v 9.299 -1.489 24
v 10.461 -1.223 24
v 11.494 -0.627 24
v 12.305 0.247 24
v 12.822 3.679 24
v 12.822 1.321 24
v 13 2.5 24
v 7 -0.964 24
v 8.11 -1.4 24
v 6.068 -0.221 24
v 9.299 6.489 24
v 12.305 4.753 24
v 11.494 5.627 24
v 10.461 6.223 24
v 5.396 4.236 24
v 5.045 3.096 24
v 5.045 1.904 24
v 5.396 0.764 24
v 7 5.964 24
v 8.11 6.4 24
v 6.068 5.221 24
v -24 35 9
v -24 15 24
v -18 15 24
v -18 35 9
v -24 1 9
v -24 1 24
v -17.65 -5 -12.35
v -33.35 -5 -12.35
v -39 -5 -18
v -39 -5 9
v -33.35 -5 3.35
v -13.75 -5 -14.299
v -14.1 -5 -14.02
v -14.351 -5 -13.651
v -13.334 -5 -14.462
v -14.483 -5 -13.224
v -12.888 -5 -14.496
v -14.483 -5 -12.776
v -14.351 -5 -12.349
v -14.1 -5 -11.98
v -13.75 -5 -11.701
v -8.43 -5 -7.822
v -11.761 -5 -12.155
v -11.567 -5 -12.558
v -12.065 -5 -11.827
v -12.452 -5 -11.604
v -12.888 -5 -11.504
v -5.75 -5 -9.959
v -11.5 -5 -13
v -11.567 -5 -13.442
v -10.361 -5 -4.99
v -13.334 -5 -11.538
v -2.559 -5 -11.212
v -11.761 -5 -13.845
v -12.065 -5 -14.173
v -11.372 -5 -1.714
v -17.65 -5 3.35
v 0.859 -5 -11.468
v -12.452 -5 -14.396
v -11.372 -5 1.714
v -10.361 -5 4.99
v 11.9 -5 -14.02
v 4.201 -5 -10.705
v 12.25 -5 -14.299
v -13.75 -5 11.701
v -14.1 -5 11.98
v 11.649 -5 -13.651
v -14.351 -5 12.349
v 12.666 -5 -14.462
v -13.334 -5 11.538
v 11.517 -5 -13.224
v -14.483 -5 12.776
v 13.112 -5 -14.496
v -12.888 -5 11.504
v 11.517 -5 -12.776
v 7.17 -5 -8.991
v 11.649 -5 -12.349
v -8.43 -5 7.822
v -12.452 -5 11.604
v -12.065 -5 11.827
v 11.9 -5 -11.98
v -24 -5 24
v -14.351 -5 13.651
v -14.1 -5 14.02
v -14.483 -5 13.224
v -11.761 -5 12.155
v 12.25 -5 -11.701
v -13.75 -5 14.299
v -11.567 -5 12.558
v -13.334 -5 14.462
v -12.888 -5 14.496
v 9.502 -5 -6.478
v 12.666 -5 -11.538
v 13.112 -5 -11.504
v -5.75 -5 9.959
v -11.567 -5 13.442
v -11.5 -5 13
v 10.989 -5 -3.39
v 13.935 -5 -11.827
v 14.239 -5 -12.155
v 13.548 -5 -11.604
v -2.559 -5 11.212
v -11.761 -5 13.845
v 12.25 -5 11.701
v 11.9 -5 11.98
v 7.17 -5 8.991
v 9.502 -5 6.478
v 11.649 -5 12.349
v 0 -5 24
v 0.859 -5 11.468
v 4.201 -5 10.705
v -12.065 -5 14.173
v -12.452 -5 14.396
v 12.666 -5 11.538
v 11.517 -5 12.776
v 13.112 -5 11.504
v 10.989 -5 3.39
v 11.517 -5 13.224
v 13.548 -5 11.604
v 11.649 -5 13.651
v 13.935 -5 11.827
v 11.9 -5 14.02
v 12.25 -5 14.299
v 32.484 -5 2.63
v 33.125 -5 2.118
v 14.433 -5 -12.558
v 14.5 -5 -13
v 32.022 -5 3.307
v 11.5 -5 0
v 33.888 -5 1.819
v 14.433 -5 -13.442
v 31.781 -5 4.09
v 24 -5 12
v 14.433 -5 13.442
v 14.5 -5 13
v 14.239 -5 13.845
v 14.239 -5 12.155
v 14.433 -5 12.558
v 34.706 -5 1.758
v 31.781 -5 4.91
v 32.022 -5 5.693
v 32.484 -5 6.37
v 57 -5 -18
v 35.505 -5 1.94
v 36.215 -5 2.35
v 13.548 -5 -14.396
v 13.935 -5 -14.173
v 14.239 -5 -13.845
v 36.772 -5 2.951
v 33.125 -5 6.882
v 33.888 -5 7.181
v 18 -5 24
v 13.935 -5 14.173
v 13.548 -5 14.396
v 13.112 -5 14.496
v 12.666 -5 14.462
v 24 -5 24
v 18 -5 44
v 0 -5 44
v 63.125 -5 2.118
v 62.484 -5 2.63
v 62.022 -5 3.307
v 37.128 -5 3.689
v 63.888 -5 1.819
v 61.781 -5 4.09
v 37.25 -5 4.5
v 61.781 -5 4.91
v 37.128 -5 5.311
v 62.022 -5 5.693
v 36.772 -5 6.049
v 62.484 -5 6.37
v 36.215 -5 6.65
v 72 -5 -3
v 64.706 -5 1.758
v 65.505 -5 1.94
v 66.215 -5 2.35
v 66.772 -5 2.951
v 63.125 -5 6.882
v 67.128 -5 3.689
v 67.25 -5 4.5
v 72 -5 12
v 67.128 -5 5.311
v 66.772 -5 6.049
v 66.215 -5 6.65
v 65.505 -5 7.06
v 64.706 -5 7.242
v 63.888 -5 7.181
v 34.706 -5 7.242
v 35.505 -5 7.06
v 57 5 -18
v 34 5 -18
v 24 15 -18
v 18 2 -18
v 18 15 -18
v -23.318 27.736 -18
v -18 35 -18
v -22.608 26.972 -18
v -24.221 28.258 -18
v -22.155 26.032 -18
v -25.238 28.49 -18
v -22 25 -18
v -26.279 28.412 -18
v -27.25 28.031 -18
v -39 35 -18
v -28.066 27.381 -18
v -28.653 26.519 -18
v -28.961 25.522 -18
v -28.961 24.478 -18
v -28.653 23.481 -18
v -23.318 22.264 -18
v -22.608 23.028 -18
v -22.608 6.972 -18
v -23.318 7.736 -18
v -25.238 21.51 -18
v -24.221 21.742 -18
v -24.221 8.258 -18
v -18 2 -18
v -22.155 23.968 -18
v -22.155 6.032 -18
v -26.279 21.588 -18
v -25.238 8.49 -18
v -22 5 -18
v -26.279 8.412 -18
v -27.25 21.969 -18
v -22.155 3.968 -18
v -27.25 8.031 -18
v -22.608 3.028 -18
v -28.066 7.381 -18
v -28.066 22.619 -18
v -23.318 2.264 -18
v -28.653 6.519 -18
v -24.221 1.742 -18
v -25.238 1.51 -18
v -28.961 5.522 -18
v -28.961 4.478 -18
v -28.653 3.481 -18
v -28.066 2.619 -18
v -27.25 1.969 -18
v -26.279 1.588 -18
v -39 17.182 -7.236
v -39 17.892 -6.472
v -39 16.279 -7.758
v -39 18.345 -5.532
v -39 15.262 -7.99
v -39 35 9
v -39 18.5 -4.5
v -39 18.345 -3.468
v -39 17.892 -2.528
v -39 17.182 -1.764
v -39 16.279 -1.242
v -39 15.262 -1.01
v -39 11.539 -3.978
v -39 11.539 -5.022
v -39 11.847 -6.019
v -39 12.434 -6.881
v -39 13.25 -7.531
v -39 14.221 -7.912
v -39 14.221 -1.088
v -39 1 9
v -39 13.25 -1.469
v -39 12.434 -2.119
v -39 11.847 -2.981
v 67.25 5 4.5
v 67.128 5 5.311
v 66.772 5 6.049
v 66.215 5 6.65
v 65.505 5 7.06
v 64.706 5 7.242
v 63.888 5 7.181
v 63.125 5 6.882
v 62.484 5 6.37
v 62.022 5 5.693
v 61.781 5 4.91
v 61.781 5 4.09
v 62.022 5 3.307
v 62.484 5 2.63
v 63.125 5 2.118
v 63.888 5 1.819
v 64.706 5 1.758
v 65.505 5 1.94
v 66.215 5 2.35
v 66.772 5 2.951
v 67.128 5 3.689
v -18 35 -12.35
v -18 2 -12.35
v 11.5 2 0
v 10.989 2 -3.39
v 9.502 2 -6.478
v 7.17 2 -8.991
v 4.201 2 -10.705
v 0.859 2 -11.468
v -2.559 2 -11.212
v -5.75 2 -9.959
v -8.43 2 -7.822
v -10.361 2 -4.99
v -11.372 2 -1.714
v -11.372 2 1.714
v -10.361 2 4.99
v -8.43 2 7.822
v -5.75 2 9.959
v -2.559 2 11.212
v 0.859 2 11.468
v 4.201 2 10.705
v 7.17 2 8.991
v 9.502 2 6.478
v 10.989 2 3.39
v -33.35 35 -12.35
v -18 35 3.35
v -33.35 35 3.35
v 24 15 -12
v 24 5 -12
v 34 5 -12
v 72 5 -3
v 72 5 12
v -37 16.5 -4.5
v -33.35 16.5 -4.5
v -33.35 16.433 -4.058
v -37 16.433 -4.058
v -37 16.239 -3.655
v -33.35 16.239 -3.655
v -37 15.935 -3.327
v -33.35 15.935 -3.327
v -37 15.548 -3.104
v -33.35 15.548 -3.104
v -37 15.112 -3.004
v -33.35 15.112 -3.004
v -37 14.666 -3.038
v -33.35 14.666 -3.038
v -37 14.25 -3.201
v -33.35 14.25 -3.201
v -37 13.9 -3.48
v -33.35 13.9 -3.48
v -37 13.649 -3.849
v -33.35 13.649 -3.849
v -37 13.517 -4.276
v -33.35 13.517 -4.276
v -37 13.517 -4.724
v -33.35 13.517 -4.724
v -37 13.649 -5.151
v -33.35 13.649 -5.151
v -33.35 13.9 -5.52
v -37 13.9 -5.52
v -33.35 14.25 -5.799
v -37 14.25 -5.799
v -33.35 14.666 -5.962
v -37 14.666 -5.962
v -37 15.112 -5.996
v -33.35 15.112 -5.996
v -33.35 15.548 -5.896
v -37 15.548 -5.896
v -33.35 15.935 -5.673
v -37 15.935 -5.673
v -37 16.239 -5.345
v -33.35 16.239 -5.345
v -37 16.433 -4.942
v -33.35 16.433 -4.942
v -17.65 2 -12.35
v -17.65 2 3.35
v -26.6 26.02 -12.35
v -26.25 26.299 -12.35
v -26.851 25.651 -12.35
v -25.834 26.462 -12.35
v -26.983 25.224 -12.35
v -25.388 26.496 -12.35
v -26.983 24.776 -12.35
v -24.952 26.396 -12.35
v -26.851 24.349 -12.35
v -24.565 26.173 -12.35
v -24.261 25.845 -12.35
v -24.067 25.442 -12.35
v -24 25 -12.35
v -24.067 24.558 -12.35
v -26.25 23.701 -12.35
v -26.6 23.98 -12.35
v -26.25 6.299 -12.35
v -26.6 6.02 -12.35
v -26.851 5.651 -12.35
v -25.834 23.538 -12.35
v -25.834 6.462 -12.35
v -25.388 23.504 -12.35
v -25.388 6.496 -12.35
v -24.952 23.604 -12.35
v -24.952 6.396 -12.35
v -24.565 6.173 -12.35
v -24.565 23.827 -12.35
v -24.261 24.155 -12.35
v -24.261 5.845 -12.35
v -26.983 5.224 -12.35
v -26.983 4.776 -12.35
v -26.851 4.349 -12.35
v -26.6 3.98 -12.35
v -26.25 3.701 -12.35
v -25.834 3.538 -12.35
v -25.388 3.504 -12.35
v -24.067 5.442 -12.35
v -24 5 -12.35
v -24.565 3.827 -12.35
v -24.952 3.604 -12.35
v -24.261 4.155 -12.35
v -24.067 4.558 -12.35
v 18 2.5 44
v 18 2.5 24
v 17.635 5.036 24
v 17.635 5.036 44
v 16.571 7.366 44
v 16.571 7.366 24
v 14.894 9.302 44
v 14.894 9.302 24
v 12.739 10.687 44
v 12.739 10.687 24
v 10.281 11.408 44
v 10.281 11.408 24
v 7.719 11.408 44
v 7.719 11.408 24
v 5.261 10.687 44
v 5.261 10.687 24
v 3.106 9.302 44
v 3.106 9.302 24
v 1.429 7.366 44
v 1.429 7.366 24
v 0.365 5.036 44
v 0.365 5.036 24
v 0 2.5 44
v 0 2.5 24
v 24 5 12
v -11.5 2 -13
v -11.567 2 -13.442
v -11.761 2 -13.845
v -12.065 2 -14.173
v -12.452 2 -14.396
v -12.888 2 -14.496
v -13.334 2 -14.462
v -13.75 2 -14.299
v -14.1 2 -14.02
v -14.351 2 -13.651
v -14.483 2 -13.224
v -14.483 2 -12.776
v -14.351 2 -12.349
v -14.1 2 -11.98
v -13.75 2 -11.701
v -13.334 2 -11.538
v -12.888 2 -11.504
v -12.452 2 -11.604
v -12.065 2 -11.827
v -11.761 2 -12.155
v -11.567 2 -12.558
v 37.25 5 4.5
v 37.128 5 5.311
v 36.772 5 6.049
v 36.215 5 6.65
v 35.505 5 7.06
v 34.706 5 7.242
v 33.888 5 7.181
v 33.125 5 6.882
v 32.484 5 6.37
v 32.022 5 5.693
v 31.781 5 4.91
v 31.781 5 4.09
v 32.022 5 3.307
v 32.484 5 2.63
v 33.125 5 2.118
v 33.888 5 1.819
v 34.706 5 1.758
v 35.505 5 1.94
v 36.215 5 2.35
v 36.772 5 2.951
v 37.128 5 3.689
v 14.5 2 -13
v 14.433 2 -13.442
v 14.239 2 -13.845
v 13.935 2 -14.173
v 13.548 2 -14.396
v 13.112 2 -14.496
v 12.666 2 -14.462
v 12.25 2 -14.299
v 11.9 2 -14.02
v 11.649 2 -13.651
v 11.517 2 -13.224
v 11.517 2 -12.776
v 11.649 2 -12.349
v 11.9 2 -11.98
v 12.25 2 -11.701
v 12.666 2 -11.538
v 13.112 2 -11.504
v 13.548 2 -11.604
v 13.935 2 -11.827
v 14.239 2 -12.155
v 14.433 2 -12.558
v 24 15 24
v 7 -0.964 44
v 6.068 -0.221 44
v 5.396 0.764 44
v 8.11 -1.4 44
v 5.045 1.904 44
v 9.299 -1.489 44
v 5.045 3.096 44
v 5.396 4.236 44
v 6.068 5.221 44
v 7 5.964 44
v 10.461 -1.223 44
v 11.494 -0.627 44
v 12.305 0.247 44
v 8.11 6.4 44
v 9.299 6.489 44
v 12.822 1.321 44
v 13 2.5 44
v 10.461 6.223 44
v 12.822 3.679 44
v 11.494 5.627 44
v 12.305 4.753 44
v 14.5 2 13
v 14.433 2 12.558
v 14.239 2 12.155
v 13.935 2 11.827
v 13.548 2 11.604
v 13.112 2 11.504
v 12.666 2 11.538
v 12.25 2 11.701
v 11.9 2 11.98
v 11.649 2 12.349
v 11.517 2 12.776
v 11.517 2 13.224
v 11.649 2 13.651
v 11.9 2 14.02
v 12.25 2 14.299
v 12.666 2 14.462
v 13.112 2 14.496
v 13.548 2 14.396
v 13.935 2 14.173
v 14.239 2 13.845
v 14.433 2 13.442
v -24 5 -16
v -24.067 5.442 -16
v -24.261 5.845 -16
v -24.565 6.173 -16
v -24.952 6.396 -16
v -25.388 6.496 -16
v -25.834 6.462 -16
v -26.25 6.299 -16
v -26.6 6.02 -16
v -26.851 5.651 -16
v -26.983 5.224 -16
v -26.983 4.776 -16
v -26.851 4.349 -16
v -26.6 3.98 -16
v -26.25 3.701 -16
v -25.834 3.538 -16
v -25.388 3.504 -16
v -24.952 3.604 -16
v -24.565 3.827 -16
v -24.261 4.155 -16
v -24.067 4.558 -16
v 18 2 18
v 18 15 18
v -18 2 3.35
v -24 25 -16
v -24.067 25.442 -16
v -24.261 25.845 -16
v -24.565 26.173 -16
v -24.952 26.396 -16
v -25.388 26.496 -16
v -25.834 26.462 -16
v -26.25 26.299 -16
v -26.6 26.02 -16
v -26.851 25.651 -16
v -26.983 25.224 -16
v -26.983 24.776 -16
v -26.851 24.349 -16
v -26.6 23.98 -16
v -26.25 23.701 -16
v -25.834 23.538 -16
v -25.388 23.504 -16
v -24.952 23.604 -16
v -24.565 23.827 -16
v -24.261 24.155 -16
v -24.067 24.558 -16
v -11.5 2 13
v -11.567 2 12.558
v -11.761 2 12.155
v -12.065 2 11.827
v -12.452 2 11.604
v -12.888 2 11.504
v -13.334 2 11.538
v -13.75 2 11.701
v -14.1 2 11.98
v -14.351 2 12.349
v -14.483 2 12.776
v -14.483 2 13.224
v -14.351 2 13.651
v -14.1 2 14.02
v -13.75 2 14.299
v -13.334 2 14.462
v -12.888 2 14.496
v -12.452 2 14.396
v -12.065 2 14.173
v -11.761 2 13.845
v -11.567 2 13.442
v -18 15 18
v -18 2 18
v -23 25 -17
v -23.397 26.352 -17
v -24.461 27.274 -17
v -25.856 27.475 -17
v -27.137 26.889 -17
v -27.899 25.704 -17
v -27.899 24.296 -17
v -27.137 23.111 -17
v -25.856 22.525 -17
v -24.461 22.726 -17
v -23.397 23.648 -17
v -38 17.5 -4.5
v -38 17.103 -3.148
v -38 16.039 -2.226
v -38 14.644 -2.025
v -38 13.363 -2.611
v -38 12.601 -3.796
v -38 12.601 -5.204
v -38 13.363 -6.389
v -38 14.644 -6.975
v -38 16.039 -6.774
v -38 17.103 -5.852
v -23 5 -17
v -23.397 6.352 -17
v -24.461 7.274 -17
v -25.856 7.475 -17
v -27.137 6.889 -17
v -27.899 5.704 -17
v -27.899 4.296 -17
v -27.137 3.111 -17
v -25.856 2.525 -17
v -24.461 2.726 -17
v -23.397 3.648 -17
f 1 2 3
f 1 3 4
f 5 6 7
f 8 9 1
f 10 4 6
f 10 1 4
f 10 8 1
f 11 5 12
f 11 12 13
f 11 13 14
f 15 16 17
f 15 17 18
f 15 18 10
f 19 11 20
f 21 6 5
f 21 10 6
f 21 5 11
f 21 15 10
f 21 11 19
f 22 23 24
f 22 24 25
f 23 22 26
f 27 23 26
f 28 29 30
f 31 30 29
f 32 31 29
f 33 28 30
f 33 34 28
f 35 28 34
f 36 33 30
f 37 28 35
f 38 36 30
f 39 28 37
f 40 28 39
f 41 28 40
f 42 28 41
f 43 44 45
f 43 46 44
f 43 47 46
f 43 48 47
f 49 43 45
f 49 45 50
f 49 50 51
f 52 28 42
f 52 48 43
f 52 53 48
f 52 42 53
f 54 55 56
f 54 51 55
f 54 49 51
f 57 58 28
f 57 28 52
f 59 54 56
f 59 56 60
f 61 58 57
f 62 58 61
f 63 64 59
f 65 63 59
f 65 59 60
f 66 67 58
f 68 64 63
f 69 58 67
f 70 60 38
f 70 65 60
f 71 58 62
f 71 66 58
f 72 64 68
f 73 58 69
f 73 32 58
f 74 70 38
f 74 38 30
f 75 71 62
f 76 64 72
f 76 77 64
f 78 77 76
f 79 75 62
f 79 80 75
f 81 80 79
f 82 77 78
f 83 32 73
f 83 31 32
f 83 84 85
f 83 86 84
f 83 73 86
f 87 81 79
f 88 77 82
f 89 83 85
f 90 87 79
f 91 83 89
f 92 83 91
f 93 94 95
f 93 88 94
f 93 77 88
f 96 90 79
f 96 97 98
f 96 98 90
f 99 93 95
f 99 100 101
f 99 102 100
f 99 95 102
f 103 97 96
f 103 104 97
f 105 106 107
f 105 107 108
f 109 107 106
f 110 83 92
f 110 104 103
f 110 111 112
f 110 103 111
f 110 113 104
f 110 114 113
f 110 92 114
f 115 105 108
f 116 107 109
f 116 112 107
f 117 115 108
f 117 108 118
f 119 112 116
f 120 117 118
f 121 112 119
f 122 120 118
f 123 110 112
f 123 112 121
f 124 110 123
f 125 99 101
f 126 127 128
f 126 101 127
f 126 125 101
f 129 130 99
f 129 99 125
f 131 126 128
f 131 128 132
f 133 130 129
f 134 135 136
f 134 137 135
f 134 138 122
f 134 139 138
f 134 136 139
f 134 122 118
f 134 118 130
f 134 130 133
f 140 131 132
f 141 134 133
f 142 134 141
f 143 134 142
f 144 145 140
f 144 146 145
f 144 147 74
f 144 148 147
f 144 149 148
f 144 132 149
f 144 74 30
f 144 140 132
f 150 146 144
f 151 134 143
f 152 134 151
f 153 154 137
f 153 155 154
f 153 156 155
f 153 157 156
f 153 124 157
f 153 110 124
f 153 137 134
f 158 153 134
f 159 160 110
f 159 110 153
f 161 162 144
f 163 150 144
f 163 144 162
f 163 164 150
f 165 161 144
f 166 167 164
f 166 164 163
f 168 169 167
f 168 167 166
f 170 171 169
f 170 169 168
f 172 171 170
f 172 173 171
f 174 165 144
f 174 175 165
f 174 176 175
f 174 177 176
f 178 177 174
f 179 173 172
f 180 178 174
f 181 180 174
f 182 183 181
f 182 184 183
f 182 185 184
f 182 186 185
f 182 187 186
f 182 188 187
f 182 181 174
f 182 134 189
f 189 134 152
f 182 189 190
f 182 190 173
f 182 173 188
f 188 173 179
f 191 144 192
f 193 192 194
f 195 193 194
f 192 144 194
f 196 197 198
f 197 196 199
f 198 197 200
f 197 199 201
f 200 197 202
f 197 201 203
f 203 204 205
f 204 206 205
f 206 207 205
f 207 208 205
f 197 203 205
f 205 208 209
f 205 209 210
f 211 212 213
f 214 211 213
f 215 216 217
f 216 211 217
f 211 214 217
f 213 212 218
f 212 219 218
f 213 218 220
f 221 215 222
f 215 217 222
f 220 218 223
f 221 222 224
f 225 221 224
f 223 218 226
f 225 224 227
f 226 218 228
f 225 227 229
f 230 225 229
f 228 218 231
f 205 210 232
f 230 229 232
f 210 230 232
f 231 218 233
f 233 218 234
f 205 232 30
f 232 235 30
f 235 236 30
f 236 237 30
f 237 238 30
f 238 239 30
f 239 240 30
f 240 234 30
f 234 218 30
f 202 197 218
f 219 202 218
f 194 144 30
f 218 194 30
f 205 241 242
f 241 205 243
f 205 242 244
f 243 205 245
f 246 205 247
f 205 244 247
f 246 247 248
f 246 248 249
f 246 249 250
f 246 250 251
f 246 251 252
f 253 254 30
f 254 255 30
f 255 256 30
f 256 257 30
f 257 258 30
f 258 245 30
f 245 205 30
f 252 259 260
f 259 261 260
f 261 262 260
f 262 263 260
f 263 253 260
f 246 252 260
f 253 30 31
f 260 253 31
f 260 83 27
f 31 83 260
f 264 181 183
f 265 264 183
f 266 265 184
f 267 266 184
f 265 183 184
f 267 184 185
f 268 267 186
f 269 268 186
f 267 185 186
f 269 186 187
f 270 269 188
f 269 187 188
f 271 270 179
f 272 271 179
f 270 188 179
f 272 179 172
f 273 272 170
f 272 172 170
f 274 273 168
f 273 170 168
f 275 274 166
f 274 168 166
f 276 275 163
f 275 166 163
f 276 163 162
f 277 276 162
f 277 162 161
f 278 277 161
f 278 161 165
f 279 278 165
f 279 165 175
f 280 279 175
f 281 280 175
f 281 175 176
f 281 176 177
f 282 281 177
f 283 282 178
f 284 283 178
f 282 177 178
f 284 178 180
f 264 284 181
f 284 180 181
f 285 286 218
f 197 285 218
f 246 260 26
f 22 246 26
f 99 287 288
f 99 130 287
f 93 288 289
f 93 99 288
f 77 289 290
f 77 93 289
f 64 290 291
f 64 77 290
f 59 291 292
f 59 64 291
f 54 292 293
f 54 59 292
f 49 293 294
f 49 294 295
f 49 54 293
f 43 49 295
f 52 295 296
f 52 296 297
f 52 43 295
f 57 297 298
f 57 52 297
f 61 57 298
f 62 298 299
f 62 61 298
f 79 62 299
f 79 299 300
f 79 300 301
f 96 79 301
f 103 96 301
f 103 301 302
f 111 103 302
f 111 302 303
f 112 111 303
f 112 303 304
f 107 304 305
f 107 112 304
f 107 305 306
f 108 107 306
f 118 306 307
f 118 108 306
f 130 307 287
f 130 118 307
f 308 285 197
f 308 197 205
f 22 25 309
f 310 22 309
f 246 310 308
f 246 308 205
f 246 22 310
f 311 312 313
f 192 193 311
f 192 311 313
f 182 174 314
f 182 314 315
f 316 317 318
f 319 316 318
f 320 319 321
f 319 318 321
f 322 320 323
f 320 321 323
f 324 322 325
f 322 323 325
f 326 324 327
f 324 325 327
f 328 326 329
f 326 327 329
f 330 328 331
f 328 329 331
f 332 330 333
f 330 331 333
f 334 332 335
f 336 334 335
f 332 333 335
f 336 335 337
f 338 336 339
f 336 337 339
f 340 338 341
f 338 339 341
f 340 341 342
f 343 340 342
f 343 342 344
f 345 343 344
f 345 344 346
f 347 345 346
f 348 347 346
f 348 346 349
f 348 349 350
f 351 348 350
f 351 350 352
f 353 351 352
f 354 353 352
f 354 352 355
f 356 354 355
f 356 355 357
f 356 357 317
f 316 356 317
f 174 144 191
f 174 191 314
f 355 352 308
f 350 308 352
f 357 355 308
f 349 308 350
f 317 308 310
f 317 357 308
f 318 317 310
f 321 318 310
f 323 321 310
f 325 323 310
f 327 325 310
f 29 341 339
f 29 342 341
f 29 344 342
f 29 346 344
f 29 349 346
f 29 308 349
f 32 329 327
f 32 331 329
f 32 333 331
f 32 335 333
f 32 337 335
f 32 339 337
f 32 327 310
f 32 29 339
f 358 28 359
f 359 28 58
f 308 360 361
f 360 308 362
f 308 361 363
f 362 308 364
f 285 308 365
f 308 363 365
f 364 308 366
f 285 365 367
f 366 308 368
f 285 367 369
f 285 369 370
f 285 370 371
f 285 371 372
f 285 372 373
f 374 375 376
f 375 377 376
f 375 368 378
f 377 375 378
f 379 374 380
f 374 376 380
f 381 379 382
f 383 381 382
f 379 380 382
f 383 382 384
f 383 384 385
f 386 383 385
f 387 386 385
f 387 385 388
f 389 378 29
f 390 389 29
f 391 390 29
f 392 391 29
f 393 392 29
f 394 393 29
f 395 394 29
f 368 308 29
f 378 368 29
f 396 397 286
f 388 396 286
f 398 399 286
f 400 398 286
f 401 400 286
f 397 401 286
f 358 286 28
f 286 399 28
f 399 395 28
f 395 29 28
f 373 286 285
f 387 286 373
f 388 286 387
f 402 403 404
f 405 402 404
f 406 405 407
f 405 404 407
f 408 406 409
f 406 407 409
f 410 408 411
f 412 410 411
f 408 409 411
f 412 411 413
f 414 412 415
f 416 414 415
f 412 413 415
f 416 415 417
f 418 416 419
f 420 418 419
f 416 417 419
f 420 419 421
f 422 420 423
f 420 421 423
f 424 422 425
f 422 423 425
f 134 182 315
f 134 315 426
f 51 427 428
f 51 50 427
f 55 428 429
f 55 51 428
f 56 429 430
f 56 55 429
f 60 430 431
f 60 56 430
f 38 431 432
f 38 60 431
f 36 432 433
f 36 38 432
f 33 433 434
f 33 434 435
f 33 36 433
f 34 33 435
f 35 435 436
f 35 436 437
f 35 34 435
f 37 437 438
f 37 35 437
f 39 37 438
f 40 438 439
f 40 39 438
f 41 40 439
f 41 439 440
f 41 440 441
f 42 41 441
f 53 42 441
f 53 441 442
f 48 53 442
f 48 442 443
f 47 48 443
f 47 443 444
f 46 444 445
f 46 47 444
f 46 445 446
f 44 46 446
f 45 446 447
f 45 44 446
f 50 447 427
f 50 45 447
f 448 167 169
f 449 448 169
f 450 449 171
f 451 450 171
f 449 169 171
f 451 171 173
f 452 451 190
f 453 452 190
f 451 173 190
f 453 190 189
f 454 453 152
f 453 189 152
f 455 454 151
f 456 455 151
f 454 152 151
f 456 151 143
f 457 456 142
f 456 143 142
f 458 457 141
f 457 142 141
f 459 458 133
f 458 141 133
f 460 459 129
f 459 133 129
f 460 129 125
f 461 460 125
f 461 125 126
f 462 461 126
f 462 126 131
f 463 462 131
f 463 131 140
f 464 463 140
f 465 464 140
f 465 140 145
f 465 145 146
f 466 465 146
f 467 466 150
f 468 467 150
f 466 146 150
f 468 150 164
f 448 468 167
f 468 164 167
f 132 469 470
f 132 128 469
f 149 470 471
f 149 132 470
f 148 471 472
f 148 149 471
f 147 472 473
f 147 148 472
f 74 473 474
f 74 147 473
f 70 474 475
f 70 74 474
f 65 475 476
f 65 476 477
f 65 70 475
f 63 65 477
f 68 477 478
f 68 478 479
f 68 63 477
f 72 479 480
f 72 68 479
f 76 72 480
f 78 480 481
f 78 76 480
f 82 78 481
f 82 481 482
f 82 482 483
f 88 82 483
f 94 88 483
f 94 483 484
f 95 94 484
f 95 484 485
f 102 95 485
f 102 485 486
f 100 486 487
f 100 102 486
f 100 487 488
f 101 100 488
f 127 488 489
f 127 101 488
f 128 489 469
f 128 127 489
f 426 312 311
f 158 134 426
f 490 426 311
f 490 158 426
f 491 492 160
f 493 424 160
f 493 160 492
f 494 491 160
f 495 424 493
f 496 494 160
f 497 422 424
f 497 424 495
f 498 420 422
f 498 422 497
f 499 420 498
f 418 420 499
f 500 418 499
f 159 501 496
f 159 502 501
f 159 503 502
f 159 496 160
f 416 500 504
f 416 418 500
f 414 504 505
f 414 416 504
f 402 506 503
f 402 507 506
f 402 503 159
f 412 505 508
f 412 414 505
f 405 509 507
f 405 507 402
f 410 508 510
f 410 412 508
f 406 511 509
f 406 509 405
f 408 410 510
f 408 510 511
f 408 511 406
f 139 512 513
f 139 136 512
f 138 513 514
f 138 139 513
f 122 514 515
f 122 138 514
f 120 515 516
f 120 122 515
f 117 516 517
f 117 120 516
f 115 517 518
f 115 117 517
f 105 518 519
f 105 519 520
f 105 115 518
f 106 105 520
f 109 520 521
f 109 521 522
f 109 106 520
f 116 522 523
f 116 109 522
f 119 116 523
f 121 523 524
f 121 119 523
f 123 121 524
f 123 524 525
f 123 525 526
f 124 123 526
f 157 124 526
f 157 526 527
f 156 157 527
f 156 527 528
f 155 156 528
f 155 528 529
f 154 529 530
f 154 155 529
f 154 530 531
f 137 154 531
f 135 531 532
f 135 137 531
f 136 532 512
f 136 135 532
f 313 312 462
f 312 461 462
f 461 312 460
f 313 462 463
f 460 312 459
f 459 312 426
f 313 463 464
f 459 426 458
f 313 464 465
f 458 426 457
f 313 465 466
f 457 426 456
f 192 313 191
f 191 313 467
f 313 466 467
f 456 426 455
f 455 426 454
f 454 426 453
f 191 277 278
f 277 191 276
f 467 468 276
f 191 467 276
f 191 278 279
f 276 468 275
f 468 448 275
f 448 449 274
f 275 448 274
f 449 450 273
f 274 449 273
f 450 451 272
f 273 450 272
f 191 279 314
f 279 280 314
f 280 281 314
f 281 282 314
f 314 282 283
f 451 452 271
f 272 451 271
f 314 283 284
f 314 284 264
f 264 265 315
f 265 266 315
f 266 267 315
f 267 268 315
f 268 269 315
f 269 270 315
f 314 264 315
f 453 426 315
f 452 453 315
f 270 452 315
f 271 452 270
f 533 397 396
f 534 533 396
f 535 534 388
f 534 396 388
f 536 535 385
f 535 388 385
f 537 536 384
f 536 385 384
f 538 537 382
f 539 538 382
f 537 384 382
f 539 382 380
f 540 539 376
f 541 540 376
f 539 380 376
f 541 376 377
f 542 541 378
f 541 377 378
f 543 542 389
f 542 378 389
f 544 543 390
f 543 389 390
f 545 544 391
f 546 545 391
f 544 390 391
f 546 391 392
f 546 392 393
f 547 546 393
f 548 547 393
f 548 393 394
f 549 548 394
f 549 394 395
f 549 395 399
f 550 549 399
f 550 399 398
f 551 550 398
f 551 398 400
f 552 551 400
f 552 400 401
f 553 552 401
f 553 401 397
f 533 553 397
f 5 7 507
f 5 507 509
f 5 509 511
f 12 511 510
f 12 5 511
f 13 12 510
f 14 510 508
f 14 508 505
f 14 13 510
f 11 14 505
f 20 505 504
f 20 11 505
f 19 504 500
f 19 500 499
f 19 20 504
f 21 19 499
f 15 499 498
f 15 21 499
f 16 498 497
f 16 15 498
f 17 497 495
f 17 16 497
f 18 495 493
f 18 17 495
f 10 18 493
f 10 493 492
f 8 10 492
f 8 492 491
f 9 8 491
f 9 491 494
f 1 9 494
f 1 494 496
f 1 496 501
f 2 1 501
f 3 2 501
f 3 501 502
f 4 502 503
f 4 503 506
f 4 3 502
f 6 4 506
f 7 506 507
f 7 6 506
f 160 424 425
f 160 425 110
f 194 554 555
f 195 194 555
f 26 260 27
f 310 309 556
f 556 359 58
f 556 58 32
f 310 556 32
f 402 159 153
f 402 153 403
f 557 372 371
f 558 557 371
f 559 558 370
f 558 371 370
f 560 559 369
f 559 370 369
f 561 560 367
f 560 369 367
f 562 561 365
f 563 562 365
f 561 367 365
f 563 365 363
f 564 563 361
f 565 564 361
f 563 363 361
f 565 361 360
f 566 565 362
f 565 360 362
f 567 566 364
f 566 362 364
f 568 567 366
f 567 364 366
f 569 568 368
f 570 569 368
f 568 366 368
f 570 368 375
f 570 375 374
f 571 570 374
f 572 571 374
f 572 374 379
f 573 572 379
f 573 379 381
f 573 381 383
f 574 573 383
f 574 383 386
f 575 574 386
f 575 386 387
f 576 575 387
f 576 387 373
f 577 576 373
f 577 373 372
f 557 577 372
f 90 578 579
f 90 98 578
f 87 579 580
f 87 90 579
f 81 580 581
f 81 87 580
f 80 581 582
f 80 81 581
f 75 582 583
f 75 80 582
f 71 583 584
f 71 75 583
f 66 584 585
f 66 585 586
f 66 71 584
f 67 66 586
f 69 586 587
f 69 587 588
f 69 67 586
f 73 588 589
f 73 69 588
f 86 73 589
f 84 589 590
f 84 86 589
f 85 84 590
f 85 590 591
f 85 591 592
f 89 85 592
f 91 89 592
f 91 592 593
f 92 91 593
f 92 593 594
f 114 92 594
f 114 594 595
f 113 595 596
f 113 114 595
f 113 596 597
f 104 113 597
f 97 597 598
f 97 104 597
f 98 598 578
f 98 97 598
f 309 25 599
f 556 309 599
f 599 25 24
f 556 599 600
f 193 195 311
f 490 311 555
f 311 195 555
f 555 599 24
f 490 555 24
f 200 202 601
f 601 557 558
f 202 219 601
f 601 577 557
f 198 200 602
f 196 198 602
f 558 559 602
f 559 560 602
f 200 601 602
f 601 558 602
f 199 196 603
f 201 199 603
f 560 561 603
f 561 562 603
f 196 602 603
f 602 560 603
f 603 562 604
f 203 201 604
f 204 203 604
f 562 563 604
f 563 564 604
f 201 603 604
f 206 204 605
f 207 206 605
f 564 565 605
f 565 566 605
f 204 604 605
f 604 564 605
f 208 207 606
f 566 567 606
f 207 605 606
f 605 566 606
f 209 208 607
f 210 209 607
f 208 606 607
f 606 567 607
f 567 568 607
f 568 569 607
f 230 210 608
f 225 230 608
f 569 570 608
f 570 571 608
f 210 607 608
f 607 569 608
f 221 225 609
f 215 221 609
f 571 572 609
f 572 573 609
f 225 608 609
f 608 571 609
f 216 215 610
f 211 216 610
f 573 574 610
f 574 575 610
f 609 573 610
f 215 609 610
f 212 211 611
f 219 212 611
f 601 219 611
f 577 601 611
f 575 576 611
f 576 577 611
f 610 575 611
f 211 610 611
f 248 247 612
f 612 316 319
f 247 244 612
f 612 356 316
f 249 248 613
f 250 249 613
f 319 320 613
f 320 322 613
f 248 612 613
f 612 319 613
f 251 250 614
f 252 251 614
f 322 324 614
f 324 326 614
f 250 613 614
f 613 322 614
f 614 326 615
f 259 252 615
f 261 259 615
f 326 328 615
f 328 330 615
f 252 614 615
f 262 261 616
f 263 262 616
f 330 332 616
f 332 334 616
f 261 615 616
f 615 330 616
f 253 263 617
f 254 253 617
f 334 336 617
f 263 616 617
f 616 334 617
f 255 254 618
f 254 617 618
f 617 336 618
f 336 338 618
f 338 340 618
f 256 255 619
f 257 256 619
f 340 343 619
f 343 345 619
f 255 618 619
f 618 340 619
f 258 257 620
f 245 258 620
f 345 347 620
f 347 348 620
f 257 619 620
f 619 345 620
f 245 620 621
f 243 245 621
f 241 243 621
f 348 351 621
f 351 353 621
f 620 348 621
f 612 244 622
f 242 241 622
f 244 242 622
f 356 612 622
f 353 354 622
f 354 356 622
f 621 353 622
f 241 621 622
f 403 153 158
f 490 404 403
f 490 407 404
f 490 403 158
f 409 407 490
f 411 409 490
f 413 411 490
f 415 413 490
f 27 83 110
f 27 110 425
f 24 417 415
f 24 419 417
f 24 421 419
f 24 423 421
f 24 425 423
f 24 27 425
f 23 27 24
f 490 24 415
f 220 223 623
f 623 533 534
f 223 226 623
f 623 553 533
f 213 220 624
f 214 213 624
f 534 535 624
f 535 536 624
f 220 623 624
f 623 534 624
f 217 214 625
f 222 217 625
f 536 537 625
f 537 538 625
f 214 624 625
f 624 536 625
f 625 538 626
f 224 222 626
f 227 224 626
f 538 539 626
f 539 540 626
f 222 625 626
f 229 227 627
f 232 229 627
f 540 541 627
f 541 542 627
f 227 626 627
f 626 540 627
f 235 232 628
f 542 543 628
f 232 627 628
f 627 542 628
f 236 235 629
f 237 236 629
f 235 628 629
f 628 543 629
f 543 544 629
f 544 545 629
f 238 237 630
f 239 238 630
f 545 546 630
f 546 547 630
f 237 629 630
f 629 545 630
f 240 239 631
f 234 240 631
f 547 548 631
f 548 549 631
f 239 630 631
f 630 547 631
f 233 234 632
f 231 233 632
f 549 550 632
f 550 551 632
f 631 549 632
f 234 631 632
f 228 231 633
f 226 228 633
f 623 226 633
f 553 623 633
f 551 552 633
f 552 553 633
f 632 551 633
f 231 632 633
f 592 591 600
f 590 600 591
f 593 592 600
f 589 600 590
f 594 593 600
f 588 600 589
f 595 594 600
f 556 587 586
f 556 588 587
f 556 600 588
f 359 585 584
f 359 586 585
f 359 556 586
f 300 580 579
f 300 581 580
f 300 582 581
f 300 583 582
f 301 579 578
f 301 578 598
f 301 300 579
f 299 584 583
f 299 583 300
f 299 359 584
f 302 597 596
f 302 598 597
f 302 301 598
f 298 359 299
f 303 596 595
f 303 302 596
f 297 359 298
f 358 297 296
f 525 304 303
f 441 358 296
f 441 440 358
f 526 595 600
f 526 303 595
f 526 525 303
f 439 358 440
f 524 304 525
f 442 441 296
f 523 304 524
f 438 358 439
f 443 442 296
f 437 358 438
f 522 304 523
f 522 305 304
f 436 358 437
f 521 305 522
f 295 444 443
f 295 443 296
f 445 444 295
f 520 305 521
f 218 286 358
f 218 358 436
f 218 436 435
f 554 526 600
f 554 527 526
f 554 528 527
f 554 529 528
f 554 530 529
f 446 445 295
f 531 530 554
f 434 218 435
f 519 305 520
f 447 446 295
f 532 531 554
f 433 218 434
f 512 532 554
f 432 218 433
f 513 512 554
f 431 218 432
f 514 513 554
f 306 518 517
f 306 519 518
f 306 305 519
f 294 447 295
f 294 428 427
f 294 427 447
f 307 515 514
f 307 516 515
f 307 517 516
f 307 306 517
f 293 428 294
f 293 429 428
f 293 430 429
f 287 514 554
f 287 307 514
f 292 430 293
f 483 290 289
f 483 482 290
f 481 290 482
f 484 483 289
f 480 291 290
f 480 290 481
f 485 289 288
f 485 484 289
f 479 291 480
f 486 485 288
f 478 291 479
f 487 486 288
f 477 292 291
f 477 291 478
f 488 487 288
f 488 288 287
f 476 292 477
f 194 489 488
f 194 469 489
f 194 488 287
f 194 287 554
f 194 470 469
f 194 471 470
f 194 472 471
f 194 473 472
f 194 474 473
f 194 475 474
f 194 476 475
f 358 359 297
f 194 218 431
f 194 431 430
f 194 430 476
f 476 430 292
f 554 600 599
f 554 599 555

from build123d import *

# Parameters (mm, degrees)
F0_R        = 1.5
F0_W        = 15
F0_H        = 15
F0_R_2      = 11.5
F1_DEPTH    = 5
F3_DEPTH    = 35
F5_DEPTH    = 20
F6_R        = 1.5
F7_DEPTH    = 6.001
F9_DEPTH    = 6
F11_DEPTH   = 6
F12_R       = 1.5
F13_DEPTH   = 6.001
F14_W       = 20
F14_H       = 42
F15_DEPTH   = 6
F16_R       = 2.75
F17_DEPTH   = 10
F19_DEPTH   = 6
F20_SIZE    = 2
F21_W       = 15.7
F21_H       = 15.7
F22_DEPTH   = 40.001
F1_FACE_R   = 1.5
F1_FACE_R_2 = 11.5
F23_DEPTH   = 2
F24_R       = 4
F25_DEPTH   = 20


with BuildPart() as f1:
    # F0 (on Front) → F1 (new body)
    with BuildSketch(Plane.XZ):
        Polygon((18, -18), (18, 18), (-18, 18), (-18, 9), (-33, 9), (-39, 9), (-39, -18), (-33, -18), (-18, -18), align=None)
        with Locations((-13, -13)):
            Circle(F0_R, mode=Mode.SUBTRACT)
        with Locations((-25.5, -4.5)):
            Rectangle(F0_W, F0_H, mode=Mode.SUBTRACT)
        with Locations((13, -13)):
            Circle(F0_R, mode=Mode.SUBTRACT)
        with Locations((-13, 13)):
            Circle(F0_R, mode=Mode.SUBTRACT)
        Circle(F0_R_2, mode=Mode.SUBTRACT)
        with Locations((13, 13)):
            Circle(F0_R, mode=Mode.SUBTRACT)
    extrude(amount=F1_DEPTH)

    # F2 (on face) → F3 (join)
    with BuildSketch(Plane(origin=(0, 0, 0), x_dir=(-1, 0, 0), z_dir=(0, 1, 0))):
        Polygon((18, 9), (18, 3), (33, 3), (33, -12), (18, -12), (18, -18), (39, -18), (39, 9), align=None)
    extrude(amount=F3_DEPTH)

    # F4 (on face) → F5 (join)
    with BuildSketch(Plane.XZ.offset(5)):
        Polygon((-24, 9), (-18, 9), (-18, 18), (18, 18), (18, 24), (-24, 24), align=None)
    extrude(amount=-F5_DEPTH)

    # F6 (on face) → F7 (cut, through all)
    with BuildSketch(Plane.YZ.offset(-33)):
        with Locations((15, -4.5)):
            Circle(F6_R)
    extrude(amount=-F7_DEPTH, mode=Mode.SUBTRACT)

    # F8 (on face) → F9 (join, through all)
    with BuildSketch(Plane(origin=(-24, 0, 0), x_dir=(0, -1, 0), z_dir=(-1, 0, 0))):
        Polygon((-15, 9), (-15, 24), (-35, 9), align=None)
    extrude(amount=-F9_DEPTH)

    # F10 (on face) → F11 (join)
    with BuildSketch(Plane.XZ.offset(5)):
        Polygon((-24, 9), (-24, 24), (-39, 9), align=None)
    extrude(amount=-F11_DEPTH)

    # F12 (on face) → F13 (cut, through all)
    with BuildSketch(Plane.XY.offset(-12)):
        with Locations((-25.5, 5)):
            Circle(F12_R)
        with Locations((-25.5, 25)):
            Circle(F12_R)
    extrude(amount=-F13_DEPTH, mode=Mode.SUBTRACT)

    # F14 (on face) → F15 (join)
    with BuildSketch(Plane.YZ.offset(18)):
        with Locations((5, 3)):
            Rectangle(F14_W, F14_H)
    extrude(amount=F15_DEPTH)

    # F16 (on face) → F17 (join)
    with BuildSketch(Plane.XZ.offset(5)):
        Polygon((24, 12), (24, -18), (57, -18), (72, -3), (72, 12), align=None)
        with Locations((34.5, 4.5)):
            Circle(F16_R, mode=Mode.SUBTRACT)
        with Locations((64.5, 4.5)):
            Circle(F16_R, mode=Mode.SUBTRACT)
    extrude(amount=-F17_DEPTH)

    # F18 (on face) → F19 (join, through all)
    with BuildSketch(Plane(origin=(0, 0, -18), x_dir=(1, 0, 0), z_dir=(0, 0, -1))):
        Polygon((34, -5), (24, -5), (24, -15), align=None)
    extrude(amount=-F19_DEPTH)

    # F20
    f20_edges = [f1.edges().sort_by_distance(p)[0] for p in [
        (-39, 13.5, -4.5),
        (-27, 5, -18),
        (-27, 25, -18),
    ]]
    chamfer(f20_edges, length=F20_SIZE)

    # F21 (on face) → F22 (cut, through all)
    with BuildSketch(Plane.XZ.offset(5)):
        with Locations((-25.5, -4.5)):
            Rectangle(F21_W, F21_H)
    extrude(amount=-F22_DEPTH, mode=Mode.SUBTRACT)

    # F1_face (on face) → F23 (join)
    with BuildSketch(Plane(origin=(-8.726816, 0, -1.288675), x_dir=(1, 0, 0), z_dir=(0, 1, 0))):
        Polygon((-9.273184, 16.711325), (-9.273184, 11.061325), (-8.923184, 11.061325), (-8.923184, -4.638675), (-9.273184, -4.638675), (-9.273184, -19.288675), (26.726816, -19.288675), (26.726816, 16.711325), align=None)
        with Locations((-4.273184, 11.711325)):
            Circle(F1_FACE_R, mode=Mode.SUBTRACT)
        with Locations((21.726816, 11.711325)):
            Circle(F1_FACE_R, mode=Mode.SUBTRACT)
        with Locations((-4.273184, -14.288675)):
            Circle(F1_FACE_R, mode=Mode.SUBTRACT)
        with Locations((8.726816, -1.288675)):
            Circle(F1_FACE_R_2, mode=Mode.SUBTRACT)
        with Locations((21.726816, -14.288675)):
            Circle(F1_FACE_R, mode=Mode.SUBTRACT)
    extrude(amount=F23_DEPTH)

    # F24 (on face) → F25 (join)
    with BuildSketch(Plane.XY.offset(24)):
        with BuildLine():
            Line((0, 2.5), (0, -5))
            Line((0, -5), (18, -5))
            Line((18, -5), (18, 2.5))
            ThreePointArc((18, 2.5), (9, 11.5), (0, 2.5))
        make_face()
        with Locations((9, 2.5)):
            Circle(F24_R, mode=Mode.SUBTRACT)
    extrude(amount=F25_DEPTH)


solid = f1.part
